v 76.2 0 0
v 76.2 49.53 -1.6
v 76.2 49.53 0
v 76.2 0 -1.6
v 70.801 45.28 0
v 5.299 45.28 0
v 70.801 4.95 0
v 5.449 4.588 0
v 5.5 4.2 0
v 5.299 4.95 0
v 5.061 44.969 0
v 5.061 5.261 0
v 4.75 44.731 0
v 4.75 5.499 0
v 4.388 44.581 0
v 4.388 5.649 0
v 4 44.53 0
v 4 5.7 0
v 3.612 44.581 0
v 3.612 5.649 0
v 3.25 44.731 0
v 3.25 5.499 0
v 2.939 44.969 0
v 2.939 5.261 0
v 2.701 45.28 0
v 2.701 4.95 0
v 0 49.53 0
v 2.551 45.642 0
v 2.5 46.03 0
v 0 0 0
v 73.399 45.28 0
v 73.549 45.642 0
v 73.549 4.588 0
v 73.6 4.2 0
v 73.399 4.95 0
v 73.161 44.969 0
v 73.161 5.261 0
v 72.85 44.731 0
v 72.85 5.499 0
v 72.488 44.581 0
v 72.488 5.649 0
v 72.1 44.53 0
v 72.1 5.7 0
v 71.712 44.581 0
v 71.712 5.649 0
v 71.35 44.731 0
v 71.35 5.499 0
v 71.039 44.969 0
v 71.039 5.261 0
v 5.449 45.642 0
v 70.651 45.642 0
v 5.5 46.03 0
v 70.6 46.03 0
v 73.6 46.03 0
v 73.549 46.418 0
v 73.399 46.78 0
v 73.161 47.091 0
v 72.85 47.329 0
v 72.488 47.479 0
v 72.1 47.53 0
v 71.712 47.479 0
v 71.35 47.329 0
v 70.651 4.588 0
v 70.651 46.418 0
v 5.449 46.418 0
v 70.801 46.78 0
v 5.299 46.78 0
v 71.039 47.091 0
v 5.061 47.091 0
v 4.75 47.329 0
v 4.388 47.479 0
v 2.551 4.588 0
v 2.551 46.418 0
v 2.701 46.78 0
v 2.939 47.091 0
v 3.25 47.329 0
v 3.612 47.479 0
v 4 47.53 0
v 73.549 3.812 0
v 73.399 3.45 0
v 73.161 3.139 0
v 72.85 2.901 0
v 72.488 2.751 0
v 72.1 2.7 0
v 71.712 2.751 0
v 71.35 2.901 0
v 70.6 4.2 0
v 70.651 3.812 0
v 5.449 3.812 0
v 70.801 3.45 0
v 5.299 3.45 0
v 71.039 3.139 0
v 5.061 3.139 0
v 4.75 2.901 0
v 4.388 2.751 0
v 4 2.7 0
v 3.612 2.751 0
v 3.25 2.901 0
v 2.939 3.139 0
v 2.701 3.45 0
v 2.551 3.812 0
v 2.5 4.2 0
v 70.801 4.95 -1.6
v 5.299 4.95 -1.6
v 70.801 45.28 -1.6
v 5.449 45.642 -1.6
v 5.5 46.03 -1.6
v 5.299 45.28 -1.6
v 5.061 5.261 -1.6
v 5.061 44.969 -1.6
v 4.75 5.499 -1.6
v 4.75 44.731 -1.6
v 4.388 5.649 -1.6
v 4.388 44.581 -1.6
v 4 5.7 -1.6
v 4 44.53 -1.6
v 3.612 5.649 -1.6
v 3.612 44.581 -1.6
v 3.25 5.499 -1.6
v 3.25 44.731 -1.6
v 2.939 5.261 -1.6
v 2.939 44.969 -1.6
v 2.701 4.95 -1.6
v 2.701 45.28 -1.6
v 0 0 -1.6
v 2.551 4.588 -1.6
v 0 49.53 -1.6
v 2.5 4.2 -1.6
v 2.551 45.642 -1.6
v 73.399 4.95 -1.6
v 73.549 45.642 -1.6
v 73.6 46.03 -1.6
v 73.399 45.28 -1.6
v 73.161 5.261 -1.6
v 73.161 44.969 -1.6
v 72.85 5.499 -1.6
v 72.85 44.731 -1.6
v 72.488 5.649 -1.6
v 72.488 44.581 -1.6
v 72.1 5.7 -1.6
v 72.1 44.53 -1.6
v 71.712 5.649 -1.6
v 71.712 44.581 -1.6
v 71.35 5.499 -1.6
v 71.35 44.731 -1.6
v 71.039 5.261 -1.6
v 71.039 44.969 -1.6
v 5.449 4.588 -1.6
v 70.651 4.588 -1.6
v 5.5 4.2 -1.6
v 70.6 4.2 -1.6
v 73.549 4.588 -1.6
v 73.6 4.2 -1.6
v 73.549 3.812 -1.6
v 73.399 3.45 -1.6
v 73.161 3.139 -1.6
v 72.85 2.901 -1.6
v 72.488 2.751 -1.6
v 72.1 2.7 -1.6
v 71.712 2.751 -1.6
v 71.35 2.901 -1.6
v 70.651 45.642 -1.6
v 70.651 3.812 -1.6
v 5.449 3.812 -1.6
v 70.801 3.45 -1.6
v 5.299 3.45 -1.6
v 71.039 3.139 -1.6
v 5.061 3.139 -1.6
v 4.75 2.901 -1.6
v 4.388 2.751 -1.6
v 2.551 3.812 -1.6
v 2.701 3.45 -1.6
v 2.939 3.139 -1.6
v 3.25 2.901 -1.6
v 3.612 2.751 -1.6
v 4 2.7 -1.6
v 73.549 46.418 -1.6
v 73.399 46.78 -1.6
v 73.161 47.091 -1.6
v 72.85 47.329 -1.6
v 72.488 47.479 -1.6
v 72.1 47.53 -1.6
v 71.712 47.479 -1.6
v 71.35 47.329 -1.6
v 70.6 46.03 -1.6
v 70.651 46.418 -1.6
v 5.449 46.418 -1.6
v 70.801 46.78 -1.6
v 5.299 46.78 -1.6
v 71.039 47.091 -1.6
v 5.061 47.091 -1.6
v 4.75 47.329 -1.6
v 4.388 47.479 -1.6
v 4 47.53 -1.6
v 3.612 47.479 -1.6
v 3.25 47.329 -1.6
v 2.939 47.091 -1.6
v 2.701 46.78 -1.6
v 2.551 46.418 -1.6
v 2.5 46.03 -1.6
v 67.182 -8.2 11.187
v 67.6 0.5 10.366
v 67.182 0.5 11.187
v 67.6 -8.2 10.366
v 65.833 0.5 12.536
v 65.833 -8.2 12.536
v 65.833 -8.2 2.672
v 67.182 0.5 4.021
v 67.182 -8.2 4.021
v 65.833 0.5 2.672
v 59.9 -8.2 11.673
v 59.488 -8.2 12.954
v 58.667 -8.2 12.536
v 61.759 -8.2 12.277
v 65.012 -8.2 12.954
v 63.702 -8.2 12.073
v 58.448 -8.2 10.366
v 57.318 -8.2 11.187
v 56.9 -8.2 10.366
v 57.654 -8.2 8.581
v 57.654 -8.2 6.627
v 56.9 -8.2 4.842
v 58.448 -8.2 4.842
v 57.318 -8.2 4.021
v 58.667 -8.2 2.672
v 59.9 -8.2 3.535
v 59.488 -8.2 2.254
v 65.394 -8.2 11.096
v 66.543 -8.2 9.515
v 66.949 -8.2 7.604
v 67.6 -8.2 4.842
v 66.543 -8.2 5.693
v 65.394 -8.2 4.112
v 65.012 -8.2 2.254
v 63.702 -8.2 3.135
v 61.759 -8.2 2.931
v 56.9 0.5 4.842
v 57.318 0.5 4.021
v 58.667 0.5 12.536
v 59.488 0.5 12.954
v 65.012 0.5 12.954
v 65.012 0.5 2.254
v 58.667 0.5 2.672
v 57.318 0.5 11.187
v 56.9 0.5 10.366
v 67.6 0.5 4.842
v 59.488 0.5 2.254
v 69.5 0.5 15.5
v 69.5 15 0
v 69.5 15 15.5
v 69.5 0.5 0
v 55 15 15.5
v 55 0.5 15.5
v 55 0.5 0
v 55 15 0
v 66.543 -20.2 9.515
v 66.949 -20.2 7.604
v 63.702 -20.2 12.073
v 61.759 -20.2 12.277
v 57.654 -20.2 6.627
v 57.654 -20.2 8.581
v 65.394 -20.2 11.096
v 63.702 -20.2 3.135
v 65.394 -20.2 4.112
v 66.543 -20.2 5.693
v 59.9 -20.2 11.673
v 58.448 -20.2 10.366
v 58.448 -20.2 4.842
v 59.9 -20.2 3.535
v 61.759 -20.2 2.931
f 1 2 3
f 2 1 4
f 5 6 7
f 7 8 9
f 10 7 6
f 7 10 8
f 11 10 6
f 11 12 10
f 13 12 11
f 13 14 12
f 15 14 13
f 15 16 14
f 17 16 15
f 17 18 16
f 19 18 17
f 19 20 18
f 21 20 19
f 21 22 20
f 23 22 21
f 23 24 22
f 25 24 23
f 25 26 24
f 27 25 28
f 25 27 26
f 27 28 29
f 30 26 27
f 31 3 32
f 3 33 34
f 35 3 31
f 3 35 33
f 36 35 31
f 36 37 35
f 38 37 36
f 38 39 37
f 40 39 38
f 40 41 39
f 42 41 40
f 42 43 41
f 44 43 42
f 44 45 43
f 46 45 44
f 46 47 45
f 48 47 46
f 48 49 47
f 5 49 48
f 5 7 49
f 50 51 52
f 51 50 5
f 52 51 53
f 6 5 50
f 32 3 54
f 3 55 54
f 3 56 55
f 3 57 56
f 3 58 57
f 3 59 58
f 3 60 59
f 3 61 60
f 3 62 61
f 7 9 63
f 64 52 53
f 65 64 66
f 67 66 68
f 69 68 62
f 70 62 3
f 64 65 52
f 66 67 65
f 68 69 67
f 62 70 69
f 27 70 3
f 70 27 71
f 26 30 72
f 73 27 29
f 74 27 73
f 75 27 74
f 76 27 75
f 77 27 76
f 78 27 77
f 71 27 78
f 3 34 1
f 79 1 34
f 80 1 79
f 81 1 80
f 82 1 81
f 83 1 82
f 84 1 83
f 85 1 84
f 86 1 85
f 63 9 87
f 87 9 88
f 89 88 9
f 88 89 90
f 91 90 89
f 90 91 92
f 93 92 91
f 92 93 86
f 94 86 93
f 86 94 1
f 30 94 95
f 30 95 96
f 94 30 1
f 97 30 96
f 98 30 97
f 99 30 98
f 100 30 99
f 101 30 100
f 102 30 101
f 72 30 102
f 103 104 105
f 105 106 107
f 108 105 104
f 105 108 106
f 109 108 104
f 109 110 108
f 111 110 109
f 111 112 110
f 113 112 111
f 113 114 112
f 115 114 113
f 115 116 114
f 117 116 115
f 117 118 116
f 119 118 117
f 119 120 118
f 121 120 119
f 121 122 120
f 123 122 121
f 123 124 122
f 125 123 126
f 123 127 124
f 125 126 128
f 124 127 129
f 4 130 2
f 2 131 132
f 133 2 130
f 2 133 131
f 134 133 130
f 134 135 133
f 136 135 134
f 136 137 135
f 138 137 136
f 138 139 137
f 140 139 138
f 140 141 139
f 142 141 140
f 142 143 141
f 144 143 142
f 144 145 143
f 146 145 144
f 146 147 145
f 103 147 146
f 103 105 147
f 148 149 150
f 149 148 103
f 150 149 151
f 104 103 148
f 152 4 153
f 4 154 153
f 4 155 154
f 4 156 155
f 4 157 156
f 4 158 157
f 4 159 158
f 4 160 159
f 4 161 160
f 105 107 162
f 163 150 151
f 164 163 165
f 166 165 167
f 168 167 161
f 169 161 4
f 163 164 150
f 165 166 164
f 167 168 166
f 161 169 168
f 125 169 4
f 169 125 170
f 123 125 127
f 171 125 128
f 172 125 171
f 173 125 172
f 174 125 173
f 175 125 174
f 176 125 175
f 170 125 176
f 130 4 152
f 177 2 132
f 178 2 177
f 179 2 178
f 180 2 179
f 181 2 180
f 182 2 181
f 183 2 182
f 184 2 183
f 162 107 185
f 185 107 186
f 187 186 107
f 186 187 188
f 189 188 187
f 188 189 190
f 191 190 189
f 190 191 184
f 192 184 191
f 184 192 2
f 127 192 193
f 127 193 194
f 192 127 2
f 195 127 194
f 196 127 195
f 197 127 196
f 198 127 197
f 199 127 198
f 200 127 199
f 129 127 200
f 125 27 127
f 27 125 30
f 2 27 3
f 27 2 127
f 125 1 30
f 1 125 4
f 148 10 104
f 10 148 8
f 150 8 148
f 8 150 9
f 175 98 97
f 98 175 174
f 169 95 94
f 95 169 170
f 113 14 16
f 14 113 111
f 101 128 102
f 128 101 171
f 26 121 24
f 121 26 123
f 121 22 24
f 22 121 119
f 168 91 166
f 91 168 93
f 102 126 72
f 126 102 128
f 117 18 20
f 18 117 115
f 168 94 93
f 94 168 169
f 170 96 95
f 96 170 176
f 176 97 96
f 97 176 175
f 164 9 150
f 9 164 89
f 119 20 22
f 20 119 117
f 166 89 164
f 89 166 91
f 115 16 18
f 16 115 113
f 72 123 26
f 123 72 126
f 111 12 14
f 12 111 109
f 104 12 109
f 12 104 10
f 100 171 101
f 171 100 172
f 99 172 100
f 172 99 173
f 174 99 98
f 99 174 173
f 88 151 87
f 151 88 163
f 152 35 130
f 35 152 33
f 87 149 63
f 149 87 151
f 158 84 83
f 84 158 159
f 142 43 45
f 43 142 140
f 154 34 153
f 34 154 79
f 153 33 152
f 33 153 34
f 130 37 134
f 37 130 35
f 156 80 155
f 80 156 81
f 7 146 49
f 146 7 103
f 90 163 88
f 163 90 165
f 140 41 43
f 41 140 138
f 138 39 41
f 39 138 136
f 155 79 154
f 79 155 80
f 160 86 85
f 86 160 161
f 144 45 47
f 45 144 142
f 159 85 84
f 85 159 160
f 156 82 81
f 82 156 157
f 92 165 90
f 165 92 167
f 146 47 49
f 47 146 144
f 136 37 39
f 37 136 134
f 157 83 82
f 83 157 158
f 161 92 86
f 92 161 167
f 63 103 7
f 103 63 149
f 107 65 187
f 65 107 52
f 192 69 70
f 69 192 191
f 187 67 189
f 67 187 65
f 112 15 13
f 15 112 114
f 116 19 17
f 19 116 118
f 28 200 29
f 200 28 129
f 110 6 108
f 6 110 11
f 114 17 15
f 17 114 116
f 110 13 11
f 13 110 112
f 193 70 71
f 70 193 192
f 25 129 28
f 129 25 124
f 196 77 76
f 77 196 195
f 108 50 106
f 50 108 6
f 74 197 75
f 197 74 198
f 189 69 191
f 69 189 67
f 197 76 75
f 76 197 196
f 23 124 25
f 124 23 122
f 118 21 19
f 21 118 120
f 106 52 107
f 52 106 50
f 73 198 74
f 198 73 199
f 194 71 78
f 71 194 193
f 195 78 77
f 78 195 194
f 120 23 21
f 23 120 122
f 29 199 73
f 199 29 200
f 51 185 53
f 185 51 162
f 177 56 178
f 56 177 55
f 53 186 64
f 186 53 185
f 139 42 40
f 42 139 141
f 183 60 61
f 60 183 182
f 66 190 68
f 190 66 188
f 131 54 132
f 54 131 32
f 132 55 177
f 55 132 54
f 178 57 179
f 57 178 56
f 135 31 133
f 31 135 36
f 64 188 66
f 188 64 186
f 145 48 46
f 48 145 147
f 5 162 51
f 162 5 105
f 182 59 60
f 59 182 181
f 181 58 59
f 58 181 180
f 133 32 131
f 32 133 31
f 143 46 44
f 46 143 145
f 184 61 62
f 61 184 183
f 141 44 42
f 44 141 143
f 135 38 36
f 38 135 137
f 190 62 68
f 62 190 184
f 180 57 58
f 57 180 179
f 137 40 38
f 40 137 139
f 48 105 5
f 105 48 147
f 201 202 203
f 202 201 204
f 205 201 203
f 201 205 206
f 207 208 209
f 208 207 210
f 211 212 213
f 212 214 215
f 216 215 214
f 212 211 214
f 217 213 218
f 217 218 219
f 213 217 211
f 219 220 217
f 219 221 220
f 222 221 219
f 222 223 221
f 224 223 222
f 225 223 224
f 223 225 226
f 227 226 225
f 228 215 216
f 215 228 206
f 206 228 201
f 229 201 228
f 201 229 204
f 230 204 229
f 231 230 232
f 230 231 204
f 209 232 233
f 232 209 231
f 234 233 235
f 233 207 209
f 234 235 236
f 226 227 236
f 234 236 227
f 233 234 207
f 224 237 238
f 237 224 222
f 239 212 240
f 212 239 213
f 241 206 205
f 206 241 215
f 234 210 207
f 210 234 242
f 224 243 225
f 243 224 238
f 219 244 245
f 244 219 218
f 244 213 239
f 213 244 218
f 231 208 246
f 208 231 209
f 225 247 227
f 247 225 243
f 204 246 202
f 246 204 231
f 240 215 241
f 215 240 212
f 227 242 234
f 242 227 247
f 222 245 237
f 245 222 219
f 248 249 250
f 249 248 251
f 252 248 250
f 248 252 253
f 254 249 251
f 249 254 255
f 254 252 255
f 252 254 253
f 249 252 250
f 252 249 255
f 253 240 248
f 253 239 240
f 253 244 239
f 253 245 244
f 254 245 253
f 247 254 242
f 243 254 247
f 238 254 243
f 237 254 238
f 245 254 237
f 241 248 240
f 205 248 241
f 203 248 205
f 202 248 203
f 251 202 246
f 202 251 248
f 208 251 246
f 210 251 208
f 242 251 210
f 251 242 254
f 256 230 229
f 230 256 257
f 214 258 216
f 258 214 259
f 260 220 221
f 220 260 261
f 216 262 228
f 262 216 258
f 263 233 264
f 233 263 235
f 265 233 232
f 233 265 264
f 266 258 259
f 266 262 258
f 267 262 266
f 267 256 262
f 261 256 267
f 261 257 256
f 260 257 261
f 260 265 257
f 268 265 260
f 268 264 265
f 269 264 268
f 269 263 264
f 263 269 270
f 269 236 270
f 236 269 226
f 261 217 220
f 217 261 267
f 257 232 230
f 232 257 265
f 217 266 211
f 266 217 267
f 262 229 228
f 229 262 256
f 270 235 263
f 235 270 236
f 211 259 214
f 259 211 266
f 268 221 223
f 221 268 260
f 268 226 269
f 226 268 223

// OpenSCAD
MM=1;
INCH=25.4*MM;



module daisy() {
  board_w=3.0*INCH;
  board_d=1.95*INCH;
  board_h=1.6*MM;
  module daisy_main_board() {
    hole_r=3.0*MM/2;
    // clearances between edge of hole and edge of board measured by outside caliper
    hole_x1=        2.5*MM;
    hole_x2=board_w-2.6*MM;
    hole_y1=        2.7*MM;
    hole_y2=board_d-2.0*MM;
    color("green")
    translate([0,0,-board_h])
    difference() {
      // substrate
      cube([board_w,board_d,board_h]);
      // mounting holes
      translate([hole_x1+hole_r,hole_y1+hole_r,-1*MM])
      cylinder(h=2*MM+board_h,r=hole_r,$fn=24);
      translate([hole_x2-hole_r,hole_y1+hole_r,-1*MM])
      cylinder(h=2*MM+board_h,r=hole_r,$fn=24);
      translate([hole_x1+hole_r,hole_y2-hole_r,-1*MM])
      cylinder(h=2*MM+board_h,r=hole_r,$fn=24);
      translate([hole_x2-hole_r,hole_y2-hole_r,-1*MM])
      cylinder(h=2*MM+board_h,r=hole_r,$fn=24);
    }
  }
  daisy_main_board();
  module bnc() {
    cube_w=14.5*MM;
    cube_d=14.5*MM;
    cube_h=17.1*MM-board_h;
    color("#c0c0c0")
    union() {
      cube([cube_w,cube_d,cube_h]);
      // thread
      thread_r=0.48*INCH/2;
      thread_d=23.2*MM-cube_d;
      thread_square=10.7*MM;
      intersection() {
        translate([cube_w/2,1*MM,15.3*MM-board_h-thread_r])
        rotate([90,0,0])
        cylinder(h=thread_d+1*MM,r=thread_r);
        translate([cube_w/2,1*MM,15.3*MM-board_h-thread_r])
        cube([thread_square,20*MM,thread_square],center=true);
      }
      // barrel
      barrel_r=0.37*INCH/2;
      barrel_d=35.2*MM-cube_d-thread_d;
      translate([cube_w/2,1*MM-thread_d,15.3*MM-board_h-thread_r])
      rotate([90,0,0])
      cylinder(h=barrel_d+1*MM,r=barrel_r);
    }
  }
  translate([55*MM,0.5*MM,0*MM])
  bnc();
}

daisy();
